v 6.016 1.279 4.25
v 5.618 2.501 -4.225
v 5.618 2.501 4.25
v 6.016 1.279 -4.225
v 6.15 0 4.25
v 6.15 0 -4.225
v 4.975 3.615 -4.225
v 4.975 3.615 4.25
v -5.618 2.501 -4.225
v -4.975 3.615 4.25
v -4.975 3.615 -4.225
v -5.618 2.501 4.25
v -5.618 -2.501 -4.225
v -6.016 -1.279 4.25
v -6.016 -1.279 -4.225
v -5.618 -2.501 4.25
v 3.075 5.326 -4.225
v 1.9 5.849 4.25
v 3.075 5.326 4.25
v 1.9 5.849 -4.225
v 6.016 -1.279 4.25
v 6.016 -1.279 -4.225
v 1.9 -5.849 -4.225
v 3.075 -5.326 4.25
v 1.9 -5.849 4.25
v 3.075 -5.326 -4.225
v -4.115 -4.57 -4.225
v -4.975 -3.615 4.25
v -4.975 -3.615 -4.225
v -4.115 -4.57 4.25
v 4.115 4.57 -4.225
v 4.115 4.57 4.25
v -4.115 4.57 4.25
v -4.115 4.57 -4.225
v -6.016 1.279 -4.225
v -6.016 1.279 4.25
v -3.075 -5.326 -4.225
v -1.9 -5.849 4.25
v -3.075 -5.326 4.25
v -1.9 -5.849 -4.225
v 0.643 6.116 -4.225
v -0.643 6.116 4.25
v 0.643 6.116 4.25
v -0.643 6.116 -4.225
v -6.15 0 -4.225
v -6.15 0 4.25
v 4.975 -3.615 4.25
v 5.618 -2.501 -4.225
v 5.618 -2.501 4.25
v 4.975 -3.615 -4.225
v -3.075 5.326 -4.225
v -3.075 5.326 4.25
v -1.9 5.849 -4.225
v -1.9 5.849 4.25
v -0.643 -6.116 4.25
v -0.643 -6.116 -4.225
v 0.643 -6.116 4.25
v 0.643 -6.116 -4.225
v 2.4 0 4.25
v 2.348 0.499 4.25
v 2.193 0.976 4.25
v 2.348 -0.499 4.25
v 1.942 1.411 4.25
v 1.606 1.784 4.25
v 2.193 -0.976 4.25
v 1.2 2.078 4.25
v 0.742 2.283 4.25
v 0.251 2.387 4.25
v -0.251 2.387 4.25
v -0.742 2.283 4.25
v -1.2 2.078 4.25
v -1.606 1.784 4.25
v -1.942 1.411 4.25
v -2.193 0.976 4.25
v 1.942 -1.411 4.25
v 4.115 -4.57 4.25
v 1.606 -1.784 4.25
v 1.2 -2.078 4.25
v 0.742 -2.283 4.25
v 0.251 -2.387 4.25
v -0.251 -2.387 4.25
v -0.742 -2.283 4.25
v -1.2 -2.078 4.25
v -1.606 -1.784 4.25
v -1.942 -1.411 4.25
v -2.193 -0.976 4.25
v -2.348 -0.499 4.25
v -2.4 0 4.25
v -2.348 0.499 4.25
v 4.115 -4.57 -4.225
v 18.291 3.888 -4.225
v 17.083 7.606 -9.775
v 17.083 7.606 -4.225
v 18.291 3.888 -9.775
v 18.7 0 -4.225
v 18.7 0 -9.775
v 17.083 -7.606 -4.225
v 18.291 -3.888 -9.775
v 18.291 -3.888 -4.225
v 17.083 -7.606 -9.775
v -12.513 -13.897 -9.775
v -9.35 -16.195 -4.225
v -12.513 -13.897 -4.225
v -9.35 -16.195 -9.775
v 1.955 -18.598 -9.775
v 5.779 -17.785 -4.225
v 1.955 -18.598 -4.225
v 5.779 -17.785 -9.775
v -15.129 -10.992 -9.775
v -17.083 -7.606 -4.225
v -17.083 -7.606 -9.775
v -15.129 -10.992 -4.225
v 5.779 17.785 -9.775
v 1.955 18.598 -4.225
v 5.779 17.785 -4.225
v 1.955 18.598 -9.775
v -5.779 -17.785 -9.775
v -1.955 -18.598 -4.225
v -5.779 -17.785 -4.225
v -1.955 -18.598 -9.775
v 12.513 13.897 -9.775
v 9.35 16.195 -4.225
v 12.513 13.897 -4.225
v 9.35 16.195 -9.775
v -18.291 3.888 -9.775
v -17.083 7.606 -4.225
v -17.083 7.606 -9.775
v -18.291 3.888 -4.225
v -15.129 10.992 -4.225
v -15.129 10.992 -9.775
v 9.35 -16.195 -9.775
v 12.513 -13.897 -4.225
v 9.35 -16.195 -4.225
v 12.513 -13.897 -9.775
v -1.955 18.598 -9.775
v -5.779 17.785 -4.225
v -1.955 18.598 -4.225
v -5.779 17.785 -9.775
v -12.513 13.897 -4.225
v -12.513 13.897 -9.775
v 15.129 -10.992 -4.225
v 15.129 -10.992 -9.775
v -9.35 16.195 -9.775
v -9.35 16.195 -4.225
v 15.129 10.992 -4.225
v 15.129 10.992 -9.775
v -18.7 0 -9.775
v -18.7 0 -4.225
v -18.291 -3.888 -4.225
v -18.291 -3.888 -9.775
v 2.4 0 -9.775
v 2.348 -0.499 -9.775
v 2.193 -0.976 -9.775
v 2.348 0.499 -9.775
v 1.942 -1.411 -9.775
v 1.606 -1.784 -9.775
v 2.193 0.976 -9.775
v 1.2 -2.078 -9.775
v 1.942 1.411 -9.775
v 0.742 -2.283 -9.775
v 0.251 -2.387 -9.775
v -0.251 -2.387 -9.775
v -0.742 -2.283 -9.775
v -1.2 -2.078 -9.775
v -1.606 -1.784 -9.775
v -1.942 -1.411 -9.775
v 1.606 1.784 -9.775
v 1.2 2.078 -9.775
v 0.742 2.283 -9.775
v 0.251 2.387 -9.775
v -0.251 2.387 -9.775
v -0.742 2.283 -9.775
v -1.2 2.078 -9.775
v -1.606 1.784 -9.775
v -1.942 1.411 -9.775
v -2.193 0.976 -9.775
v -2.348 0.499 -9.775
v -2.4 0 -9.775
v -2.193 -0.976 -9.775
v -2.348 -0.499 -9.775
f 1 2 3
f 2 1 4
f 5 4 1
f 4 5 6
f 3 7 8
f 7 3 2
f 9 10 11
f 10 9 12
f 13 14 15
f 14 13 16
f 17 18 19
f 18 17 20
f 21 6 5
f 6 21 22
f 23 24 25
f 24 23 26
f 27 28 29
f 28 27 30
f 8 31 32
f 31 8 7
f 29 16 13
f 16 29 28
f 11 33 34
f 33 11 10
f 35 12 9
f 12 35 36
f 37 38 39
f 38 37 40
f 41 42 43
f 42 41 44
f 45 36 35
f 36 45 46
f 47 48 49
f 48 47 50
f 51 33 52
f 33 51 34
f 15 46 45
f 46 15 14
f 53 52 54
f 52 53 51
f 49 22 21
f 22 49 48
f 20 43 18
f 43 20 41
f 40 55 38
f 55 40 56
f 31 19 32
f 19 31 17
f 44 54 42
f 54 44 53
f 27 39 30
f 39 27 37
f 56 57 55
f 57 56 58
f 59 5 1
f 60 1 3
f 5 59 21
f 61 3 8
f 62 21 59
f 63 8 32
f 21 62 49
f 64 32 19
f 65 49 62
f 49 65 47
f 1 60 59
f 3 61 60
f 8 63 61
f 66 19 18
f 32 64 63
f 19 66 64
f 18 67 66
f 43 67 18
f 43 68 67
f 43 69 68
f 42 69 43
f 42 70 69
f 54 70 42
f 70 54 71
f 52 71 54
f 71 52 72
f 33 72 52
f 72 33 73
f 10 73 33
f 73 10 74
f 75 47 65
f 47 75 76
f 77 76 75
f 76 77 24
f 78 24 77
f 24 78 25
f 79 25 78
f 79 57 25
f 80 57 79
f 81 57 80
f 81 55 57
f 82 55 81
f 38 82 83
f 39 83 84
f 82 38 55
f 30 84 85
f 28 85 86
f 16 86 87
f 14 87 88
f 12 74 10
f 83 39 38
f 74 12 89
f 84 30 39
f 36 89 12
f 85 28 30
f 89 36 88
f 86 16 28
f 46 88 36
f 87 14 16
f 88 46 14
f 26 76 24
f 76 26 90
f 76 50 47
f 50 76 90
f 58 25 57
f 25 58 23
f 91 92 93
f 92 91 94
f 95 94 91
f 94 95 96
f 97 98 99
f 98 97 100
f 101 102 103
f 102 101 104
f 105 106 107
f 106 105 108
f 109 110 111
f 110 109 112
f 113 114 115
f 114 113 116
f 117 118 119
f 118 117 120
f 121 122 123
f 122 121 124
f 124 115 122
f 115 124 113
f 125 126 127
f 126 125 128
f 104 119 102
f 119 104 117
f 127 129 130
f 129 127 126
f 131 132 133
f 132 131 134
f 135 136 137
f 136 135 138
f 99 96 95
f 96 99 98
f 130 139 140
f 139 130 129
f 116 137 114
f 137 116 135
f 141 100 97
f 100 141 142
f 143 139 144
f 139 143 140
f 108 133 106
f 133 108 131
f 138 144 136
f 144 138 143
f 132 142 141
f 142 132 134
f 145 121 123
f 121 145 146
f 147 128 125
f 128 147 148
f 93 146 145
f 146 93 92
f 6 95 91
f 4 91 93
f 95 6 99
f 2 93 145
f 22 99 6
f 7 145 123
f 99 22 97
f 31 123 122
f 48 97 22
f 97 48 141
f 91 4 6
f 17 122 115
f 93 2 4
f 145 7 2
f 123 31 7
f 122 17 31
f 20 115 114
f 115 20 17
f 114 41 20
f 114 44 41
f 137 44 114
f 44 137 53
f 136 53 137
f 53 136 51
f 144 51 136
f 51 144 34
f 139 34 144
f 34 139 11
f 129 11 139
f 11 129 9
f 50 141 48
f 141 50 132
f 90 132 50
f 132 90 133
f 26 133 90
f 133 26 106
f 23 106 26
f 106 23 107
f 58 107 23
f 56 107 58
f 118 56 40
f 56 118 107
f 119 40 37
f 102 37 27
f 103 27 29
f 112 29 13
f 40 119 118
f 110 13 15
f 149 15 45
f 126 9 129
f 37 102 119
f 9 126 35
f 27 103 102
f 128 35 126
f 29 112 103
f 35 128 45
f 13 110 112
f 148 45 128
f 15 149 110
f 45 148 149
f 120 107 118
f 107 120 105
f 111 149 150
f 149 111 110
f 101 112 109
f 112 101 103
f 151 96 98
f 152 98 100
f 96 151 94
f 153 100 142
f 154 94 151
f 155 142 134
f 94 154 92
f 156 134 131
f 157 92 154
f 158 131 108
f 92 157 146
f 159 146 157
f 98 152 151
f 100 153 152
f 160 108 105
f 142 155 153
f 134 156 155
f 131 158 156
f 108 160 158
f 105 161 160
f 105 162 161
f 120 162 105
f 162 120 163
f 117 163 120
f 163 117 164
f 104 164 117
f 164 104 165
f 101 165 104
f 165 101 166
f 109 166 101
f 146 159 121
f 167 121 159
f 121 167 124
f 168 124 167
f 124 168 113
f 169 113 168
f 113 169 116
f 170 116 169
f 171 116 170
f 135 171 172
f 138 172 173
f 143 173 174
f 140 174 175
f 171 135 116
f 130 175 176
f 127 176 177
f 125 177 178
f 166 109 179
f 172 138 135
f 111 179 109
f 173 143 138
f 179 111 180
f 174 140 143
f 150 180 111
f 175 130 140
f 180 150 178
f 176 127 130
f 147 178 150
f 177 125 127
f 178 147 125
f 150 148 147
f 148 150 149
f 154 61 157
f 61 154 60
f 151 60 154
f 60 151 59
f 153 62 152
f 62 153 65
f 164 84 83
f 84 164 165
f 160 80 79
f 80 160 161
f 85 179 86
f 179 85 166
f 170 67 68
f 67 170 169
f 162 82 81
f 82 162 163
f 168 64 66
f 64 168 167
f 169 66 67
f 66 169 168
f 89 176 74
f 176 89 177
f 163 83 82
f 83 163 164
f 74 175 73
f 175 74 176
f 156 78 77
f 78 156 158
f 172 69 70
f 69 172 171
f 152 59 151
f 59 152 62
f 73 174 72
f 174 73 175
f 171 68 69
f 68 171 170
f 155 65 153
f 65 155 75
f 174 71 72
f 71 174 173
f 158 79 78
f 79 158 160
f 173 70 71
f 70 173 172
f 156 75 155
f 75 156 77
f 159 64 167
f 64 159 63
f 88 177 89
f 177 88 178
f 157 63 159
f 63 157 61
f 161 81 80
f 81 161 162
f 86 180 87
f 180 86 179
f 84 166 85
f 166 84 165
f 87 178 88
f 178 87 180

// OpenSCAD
$fn=30;

difference(){
	union(){
		cylinder(d=12.3,h=8.5,center=true); // small
		translate([0,0,-7]) 
			cylinder(d=37.4,h=5.55,center=true); // large
	}
	cylinder(d=4.8,h=100,center=true); // screw hole
}
